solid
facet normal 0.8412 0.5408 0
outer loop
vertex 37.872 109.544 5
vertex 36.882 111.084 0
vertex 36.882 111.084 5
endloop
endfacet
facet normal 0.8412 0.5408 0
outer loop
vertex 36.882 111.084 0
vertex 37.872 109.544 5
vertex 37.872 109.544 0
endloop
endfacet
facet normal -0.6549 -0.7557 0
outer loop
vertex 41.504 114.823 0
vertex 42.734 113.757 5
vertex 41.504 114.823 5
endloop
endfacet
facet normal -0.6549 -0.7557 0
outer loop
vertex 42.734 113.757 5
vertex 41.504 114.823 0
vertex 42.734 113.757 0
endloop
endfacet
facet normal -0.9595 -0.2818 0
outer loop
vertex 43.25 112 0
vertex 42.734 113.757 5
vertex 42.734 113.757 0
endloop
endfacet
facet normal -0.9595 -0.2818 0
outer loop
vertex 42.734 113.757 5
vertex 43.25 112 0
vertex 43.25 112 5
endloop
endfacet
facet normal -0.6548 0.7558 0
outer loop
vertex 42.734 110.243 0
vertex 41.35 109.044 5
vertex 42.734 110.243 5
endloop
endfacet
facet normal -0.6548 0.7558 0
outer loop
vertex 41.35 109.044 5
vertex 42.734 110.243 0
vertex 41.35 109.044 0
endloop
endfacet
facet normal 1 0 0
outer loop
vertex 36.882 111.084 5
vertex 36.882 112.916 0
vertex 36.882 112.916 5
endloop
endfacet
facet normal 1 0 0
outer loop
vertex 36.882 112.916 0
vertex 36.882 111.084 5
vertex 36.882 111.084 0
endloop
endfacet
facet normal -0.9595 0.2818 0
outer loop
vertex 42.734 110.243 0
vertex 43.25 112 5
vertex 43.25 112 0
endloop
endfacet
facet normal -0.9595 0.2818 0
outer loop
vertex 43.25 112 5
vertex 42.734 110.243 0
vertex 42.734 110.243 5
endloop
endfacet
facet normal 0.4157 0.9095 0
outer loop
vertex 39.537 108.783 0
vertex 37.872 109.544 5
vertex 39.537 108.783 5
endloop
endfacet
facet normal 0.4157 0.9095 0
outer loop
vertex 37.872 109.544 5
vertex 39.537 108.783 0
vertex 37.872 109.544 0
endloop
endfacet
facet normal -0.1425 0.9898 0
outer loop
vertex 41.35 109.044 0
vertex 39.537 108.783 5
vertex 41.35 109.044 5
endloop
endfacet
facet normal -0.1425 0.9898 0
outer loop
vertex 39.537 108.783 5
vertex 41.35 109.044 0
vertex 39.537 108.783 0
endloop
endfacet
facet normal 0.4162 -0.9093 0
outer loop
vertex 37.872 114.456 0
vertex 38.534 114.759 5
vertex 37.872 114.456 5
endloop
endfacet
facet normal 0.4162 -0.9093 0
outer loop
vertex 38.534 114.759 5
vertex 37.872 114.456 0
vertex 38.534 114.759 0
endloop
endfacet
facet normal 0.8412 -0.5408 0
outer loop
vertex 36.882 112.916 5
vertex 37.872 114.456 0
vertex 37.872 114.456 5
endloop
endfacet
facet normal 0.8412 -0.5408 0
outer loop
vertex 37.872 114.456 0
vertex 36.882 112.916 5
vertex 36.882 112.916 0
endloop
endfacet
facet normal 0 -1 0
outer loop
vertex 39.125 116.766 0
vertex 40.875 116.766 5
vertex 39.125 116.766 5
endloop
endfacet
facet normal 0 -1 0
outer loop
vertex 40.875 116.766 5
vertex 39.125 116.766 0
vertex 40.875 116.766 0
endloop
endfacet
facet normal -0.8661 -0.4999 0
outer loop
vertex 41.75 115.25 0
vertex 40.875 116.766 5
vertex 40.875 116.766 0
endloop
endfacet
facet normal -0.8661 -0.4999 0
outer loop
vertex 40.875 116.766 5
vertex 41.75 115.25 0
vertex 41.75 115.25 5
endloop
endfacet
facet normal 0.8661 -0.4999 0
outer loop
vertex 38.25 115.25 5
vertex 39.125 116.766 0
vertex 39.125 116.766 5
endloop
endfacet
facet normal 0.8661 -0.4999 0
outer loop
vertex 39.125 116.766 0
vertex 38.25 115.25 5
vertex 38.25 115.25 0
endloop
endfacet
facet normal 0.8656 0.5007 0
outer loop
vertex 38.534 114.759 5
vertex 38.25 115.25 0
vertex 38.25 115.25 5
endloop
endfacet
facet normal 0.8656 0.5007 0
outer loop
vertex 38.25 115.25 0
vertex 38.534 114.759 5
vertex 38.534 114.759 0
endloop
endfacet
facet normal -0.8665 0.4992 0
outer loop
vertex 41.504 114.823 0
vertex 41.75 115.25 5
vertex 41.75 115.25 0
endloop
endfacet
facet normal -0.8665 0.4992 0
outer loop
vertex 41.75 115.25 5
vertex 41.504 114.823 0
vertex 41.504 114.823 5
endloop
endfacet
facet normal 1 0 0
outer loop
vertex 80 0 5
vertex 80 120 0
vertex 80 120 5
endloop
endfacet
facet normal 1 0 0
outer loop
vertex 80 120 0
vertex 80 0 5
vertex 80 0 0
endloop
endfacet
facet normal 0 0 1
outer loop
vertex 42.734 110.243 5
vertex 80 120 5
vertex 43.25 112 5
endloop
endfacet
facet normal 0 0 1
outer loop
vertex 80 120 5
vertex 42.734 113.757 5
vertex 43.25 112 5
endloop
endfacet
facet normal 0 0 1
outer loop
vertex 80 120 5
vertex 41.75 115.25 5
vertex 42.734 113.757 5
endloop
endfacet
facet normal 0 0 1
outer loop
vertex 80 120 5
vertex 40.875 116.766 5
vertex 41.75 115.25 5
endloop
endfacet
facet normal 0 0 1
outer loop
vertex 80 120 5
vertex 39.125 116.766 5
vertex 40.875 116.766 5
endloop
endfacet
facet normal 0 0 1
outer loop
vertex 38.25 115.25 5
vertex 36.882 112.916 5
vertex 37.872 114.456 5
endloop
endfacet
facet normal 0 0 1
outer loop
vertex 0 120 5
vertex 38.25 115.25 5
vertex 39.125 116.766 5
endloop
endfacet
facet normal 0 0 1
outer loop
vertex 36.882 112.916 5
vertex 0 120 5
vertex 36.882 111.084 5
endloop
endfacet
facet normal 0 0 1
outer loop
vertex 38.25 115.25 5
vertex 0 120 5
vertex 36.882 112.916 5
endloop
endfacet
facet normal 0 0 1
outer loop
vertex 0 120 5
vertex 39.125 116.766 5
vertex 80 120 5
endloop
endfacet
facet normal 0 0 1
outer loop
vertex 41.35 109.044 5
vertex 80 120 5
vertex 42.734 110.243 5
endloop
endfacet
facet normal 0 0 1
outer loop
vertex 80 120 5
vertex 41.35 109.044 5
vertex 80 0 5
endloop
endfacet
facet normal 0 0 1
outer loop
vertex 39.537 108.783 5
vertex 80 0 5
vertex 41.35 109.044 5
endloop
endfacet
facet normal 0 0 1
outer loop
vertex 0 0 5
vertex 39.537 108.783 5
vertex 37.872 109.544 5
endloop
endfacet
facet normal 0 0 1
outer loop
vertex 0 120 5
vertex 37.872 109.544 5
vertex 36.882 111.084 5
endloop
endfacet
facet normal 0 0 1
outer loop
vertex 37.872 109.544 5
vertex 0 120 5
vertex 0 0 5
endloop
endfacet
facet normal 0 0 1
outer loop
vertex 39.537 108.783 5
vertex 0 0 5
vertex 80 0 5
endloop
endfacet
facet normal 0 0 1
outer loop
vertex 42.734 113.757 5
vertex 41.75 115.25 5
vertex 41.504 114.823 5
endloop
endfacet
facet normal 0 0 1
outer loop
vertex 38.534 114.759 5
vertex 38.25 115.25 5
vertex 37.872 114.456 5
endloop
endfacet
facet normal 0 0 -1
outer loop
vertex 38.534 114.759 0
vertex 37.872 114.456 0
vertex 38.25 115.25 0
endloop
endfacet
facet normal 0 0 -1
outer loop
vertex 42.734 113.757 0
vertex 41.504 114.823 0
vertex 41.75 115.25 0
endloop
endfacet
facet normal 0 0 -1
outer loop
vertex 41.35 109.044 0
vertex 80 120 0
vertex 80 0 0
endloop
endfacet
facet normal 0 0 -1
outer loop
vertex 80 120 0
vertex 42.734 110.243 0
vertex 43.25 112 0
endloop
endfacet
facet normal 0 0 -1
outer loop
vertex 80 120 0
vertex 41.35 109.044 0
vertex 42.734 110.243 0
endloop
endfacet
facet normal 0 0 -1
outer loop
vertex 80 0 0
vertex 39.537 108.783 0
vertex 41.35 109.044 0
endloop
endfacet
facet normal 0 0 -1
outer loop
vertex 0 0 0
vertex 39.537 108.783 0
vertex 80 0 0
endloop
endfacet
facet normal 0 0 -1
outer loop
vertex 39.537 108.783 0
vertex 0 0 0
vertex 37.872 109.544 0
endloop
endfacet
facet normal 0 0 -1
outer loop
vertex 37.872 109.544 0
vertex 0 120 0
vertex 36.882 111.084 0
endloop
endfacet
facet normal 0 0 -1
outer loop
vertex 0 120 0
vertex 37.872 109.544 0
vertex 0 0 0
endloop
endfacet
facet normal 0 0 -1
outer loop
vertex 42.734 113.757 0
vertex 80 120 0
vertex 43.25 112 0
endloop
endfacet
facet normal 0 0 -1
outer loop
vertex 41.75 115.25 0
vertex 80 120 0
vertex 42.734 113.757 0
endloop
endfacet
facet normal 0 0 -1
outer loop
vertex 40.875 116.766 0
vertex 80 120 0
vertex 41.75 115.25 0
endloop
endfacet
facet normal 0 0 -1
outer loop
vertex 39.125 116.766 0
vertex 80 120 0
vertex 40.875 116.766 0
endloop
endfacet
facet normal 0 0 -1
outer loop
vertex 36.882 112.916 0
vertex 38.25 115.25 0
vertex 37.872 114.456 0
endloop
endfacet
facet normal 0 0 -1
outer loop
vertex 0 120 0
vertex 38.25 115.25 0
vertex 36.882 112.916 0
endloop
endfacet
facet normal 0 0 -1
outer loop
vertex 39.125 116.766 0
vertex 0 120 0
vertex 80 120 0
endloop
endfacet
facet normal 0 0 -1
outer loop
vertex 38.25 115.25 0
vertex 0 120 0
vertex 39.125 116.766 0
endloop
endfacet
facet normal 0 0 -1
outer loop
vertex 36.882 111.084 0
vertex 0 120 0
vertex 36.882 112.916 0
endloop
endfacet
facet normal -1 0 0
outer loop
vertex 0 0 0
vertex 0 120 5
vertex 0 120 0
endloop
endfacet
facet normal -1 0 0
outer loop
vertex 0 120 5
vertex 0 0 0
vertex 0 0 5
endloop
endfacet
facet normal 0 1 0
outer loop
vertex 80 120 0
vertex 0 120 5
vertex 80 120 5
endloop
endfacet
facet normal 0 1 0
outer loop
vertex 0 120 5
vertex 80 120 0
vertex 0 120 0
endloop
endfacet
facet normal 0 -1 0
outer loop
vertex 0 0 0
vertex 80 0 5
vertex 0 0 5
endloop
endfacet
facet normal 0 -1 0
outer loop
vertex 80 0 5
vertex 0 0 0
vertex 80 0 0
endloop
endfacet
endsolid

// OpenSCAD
module name() {
  linear_extrude(5) {
    translate([15, 5]) {
      scale([0.52, 0.52]) {
        translate([4.5, 100])
          import("name-1.svg");
        import("name-2.svg");
      }
    }
  };
}

module plate() {
  difference() {
    cube([80, 120, 5]);
    translate([40, 112, 0]) {
      cylinder(d = 6.5, h = 40, center = true);
      translate([0, 6.5 / 2, 0])
        cylinder(d = 3.5, h = 40, center=true);
    }
  };
}

// difference() {
//   plate();
//   name();
// };

plate();
